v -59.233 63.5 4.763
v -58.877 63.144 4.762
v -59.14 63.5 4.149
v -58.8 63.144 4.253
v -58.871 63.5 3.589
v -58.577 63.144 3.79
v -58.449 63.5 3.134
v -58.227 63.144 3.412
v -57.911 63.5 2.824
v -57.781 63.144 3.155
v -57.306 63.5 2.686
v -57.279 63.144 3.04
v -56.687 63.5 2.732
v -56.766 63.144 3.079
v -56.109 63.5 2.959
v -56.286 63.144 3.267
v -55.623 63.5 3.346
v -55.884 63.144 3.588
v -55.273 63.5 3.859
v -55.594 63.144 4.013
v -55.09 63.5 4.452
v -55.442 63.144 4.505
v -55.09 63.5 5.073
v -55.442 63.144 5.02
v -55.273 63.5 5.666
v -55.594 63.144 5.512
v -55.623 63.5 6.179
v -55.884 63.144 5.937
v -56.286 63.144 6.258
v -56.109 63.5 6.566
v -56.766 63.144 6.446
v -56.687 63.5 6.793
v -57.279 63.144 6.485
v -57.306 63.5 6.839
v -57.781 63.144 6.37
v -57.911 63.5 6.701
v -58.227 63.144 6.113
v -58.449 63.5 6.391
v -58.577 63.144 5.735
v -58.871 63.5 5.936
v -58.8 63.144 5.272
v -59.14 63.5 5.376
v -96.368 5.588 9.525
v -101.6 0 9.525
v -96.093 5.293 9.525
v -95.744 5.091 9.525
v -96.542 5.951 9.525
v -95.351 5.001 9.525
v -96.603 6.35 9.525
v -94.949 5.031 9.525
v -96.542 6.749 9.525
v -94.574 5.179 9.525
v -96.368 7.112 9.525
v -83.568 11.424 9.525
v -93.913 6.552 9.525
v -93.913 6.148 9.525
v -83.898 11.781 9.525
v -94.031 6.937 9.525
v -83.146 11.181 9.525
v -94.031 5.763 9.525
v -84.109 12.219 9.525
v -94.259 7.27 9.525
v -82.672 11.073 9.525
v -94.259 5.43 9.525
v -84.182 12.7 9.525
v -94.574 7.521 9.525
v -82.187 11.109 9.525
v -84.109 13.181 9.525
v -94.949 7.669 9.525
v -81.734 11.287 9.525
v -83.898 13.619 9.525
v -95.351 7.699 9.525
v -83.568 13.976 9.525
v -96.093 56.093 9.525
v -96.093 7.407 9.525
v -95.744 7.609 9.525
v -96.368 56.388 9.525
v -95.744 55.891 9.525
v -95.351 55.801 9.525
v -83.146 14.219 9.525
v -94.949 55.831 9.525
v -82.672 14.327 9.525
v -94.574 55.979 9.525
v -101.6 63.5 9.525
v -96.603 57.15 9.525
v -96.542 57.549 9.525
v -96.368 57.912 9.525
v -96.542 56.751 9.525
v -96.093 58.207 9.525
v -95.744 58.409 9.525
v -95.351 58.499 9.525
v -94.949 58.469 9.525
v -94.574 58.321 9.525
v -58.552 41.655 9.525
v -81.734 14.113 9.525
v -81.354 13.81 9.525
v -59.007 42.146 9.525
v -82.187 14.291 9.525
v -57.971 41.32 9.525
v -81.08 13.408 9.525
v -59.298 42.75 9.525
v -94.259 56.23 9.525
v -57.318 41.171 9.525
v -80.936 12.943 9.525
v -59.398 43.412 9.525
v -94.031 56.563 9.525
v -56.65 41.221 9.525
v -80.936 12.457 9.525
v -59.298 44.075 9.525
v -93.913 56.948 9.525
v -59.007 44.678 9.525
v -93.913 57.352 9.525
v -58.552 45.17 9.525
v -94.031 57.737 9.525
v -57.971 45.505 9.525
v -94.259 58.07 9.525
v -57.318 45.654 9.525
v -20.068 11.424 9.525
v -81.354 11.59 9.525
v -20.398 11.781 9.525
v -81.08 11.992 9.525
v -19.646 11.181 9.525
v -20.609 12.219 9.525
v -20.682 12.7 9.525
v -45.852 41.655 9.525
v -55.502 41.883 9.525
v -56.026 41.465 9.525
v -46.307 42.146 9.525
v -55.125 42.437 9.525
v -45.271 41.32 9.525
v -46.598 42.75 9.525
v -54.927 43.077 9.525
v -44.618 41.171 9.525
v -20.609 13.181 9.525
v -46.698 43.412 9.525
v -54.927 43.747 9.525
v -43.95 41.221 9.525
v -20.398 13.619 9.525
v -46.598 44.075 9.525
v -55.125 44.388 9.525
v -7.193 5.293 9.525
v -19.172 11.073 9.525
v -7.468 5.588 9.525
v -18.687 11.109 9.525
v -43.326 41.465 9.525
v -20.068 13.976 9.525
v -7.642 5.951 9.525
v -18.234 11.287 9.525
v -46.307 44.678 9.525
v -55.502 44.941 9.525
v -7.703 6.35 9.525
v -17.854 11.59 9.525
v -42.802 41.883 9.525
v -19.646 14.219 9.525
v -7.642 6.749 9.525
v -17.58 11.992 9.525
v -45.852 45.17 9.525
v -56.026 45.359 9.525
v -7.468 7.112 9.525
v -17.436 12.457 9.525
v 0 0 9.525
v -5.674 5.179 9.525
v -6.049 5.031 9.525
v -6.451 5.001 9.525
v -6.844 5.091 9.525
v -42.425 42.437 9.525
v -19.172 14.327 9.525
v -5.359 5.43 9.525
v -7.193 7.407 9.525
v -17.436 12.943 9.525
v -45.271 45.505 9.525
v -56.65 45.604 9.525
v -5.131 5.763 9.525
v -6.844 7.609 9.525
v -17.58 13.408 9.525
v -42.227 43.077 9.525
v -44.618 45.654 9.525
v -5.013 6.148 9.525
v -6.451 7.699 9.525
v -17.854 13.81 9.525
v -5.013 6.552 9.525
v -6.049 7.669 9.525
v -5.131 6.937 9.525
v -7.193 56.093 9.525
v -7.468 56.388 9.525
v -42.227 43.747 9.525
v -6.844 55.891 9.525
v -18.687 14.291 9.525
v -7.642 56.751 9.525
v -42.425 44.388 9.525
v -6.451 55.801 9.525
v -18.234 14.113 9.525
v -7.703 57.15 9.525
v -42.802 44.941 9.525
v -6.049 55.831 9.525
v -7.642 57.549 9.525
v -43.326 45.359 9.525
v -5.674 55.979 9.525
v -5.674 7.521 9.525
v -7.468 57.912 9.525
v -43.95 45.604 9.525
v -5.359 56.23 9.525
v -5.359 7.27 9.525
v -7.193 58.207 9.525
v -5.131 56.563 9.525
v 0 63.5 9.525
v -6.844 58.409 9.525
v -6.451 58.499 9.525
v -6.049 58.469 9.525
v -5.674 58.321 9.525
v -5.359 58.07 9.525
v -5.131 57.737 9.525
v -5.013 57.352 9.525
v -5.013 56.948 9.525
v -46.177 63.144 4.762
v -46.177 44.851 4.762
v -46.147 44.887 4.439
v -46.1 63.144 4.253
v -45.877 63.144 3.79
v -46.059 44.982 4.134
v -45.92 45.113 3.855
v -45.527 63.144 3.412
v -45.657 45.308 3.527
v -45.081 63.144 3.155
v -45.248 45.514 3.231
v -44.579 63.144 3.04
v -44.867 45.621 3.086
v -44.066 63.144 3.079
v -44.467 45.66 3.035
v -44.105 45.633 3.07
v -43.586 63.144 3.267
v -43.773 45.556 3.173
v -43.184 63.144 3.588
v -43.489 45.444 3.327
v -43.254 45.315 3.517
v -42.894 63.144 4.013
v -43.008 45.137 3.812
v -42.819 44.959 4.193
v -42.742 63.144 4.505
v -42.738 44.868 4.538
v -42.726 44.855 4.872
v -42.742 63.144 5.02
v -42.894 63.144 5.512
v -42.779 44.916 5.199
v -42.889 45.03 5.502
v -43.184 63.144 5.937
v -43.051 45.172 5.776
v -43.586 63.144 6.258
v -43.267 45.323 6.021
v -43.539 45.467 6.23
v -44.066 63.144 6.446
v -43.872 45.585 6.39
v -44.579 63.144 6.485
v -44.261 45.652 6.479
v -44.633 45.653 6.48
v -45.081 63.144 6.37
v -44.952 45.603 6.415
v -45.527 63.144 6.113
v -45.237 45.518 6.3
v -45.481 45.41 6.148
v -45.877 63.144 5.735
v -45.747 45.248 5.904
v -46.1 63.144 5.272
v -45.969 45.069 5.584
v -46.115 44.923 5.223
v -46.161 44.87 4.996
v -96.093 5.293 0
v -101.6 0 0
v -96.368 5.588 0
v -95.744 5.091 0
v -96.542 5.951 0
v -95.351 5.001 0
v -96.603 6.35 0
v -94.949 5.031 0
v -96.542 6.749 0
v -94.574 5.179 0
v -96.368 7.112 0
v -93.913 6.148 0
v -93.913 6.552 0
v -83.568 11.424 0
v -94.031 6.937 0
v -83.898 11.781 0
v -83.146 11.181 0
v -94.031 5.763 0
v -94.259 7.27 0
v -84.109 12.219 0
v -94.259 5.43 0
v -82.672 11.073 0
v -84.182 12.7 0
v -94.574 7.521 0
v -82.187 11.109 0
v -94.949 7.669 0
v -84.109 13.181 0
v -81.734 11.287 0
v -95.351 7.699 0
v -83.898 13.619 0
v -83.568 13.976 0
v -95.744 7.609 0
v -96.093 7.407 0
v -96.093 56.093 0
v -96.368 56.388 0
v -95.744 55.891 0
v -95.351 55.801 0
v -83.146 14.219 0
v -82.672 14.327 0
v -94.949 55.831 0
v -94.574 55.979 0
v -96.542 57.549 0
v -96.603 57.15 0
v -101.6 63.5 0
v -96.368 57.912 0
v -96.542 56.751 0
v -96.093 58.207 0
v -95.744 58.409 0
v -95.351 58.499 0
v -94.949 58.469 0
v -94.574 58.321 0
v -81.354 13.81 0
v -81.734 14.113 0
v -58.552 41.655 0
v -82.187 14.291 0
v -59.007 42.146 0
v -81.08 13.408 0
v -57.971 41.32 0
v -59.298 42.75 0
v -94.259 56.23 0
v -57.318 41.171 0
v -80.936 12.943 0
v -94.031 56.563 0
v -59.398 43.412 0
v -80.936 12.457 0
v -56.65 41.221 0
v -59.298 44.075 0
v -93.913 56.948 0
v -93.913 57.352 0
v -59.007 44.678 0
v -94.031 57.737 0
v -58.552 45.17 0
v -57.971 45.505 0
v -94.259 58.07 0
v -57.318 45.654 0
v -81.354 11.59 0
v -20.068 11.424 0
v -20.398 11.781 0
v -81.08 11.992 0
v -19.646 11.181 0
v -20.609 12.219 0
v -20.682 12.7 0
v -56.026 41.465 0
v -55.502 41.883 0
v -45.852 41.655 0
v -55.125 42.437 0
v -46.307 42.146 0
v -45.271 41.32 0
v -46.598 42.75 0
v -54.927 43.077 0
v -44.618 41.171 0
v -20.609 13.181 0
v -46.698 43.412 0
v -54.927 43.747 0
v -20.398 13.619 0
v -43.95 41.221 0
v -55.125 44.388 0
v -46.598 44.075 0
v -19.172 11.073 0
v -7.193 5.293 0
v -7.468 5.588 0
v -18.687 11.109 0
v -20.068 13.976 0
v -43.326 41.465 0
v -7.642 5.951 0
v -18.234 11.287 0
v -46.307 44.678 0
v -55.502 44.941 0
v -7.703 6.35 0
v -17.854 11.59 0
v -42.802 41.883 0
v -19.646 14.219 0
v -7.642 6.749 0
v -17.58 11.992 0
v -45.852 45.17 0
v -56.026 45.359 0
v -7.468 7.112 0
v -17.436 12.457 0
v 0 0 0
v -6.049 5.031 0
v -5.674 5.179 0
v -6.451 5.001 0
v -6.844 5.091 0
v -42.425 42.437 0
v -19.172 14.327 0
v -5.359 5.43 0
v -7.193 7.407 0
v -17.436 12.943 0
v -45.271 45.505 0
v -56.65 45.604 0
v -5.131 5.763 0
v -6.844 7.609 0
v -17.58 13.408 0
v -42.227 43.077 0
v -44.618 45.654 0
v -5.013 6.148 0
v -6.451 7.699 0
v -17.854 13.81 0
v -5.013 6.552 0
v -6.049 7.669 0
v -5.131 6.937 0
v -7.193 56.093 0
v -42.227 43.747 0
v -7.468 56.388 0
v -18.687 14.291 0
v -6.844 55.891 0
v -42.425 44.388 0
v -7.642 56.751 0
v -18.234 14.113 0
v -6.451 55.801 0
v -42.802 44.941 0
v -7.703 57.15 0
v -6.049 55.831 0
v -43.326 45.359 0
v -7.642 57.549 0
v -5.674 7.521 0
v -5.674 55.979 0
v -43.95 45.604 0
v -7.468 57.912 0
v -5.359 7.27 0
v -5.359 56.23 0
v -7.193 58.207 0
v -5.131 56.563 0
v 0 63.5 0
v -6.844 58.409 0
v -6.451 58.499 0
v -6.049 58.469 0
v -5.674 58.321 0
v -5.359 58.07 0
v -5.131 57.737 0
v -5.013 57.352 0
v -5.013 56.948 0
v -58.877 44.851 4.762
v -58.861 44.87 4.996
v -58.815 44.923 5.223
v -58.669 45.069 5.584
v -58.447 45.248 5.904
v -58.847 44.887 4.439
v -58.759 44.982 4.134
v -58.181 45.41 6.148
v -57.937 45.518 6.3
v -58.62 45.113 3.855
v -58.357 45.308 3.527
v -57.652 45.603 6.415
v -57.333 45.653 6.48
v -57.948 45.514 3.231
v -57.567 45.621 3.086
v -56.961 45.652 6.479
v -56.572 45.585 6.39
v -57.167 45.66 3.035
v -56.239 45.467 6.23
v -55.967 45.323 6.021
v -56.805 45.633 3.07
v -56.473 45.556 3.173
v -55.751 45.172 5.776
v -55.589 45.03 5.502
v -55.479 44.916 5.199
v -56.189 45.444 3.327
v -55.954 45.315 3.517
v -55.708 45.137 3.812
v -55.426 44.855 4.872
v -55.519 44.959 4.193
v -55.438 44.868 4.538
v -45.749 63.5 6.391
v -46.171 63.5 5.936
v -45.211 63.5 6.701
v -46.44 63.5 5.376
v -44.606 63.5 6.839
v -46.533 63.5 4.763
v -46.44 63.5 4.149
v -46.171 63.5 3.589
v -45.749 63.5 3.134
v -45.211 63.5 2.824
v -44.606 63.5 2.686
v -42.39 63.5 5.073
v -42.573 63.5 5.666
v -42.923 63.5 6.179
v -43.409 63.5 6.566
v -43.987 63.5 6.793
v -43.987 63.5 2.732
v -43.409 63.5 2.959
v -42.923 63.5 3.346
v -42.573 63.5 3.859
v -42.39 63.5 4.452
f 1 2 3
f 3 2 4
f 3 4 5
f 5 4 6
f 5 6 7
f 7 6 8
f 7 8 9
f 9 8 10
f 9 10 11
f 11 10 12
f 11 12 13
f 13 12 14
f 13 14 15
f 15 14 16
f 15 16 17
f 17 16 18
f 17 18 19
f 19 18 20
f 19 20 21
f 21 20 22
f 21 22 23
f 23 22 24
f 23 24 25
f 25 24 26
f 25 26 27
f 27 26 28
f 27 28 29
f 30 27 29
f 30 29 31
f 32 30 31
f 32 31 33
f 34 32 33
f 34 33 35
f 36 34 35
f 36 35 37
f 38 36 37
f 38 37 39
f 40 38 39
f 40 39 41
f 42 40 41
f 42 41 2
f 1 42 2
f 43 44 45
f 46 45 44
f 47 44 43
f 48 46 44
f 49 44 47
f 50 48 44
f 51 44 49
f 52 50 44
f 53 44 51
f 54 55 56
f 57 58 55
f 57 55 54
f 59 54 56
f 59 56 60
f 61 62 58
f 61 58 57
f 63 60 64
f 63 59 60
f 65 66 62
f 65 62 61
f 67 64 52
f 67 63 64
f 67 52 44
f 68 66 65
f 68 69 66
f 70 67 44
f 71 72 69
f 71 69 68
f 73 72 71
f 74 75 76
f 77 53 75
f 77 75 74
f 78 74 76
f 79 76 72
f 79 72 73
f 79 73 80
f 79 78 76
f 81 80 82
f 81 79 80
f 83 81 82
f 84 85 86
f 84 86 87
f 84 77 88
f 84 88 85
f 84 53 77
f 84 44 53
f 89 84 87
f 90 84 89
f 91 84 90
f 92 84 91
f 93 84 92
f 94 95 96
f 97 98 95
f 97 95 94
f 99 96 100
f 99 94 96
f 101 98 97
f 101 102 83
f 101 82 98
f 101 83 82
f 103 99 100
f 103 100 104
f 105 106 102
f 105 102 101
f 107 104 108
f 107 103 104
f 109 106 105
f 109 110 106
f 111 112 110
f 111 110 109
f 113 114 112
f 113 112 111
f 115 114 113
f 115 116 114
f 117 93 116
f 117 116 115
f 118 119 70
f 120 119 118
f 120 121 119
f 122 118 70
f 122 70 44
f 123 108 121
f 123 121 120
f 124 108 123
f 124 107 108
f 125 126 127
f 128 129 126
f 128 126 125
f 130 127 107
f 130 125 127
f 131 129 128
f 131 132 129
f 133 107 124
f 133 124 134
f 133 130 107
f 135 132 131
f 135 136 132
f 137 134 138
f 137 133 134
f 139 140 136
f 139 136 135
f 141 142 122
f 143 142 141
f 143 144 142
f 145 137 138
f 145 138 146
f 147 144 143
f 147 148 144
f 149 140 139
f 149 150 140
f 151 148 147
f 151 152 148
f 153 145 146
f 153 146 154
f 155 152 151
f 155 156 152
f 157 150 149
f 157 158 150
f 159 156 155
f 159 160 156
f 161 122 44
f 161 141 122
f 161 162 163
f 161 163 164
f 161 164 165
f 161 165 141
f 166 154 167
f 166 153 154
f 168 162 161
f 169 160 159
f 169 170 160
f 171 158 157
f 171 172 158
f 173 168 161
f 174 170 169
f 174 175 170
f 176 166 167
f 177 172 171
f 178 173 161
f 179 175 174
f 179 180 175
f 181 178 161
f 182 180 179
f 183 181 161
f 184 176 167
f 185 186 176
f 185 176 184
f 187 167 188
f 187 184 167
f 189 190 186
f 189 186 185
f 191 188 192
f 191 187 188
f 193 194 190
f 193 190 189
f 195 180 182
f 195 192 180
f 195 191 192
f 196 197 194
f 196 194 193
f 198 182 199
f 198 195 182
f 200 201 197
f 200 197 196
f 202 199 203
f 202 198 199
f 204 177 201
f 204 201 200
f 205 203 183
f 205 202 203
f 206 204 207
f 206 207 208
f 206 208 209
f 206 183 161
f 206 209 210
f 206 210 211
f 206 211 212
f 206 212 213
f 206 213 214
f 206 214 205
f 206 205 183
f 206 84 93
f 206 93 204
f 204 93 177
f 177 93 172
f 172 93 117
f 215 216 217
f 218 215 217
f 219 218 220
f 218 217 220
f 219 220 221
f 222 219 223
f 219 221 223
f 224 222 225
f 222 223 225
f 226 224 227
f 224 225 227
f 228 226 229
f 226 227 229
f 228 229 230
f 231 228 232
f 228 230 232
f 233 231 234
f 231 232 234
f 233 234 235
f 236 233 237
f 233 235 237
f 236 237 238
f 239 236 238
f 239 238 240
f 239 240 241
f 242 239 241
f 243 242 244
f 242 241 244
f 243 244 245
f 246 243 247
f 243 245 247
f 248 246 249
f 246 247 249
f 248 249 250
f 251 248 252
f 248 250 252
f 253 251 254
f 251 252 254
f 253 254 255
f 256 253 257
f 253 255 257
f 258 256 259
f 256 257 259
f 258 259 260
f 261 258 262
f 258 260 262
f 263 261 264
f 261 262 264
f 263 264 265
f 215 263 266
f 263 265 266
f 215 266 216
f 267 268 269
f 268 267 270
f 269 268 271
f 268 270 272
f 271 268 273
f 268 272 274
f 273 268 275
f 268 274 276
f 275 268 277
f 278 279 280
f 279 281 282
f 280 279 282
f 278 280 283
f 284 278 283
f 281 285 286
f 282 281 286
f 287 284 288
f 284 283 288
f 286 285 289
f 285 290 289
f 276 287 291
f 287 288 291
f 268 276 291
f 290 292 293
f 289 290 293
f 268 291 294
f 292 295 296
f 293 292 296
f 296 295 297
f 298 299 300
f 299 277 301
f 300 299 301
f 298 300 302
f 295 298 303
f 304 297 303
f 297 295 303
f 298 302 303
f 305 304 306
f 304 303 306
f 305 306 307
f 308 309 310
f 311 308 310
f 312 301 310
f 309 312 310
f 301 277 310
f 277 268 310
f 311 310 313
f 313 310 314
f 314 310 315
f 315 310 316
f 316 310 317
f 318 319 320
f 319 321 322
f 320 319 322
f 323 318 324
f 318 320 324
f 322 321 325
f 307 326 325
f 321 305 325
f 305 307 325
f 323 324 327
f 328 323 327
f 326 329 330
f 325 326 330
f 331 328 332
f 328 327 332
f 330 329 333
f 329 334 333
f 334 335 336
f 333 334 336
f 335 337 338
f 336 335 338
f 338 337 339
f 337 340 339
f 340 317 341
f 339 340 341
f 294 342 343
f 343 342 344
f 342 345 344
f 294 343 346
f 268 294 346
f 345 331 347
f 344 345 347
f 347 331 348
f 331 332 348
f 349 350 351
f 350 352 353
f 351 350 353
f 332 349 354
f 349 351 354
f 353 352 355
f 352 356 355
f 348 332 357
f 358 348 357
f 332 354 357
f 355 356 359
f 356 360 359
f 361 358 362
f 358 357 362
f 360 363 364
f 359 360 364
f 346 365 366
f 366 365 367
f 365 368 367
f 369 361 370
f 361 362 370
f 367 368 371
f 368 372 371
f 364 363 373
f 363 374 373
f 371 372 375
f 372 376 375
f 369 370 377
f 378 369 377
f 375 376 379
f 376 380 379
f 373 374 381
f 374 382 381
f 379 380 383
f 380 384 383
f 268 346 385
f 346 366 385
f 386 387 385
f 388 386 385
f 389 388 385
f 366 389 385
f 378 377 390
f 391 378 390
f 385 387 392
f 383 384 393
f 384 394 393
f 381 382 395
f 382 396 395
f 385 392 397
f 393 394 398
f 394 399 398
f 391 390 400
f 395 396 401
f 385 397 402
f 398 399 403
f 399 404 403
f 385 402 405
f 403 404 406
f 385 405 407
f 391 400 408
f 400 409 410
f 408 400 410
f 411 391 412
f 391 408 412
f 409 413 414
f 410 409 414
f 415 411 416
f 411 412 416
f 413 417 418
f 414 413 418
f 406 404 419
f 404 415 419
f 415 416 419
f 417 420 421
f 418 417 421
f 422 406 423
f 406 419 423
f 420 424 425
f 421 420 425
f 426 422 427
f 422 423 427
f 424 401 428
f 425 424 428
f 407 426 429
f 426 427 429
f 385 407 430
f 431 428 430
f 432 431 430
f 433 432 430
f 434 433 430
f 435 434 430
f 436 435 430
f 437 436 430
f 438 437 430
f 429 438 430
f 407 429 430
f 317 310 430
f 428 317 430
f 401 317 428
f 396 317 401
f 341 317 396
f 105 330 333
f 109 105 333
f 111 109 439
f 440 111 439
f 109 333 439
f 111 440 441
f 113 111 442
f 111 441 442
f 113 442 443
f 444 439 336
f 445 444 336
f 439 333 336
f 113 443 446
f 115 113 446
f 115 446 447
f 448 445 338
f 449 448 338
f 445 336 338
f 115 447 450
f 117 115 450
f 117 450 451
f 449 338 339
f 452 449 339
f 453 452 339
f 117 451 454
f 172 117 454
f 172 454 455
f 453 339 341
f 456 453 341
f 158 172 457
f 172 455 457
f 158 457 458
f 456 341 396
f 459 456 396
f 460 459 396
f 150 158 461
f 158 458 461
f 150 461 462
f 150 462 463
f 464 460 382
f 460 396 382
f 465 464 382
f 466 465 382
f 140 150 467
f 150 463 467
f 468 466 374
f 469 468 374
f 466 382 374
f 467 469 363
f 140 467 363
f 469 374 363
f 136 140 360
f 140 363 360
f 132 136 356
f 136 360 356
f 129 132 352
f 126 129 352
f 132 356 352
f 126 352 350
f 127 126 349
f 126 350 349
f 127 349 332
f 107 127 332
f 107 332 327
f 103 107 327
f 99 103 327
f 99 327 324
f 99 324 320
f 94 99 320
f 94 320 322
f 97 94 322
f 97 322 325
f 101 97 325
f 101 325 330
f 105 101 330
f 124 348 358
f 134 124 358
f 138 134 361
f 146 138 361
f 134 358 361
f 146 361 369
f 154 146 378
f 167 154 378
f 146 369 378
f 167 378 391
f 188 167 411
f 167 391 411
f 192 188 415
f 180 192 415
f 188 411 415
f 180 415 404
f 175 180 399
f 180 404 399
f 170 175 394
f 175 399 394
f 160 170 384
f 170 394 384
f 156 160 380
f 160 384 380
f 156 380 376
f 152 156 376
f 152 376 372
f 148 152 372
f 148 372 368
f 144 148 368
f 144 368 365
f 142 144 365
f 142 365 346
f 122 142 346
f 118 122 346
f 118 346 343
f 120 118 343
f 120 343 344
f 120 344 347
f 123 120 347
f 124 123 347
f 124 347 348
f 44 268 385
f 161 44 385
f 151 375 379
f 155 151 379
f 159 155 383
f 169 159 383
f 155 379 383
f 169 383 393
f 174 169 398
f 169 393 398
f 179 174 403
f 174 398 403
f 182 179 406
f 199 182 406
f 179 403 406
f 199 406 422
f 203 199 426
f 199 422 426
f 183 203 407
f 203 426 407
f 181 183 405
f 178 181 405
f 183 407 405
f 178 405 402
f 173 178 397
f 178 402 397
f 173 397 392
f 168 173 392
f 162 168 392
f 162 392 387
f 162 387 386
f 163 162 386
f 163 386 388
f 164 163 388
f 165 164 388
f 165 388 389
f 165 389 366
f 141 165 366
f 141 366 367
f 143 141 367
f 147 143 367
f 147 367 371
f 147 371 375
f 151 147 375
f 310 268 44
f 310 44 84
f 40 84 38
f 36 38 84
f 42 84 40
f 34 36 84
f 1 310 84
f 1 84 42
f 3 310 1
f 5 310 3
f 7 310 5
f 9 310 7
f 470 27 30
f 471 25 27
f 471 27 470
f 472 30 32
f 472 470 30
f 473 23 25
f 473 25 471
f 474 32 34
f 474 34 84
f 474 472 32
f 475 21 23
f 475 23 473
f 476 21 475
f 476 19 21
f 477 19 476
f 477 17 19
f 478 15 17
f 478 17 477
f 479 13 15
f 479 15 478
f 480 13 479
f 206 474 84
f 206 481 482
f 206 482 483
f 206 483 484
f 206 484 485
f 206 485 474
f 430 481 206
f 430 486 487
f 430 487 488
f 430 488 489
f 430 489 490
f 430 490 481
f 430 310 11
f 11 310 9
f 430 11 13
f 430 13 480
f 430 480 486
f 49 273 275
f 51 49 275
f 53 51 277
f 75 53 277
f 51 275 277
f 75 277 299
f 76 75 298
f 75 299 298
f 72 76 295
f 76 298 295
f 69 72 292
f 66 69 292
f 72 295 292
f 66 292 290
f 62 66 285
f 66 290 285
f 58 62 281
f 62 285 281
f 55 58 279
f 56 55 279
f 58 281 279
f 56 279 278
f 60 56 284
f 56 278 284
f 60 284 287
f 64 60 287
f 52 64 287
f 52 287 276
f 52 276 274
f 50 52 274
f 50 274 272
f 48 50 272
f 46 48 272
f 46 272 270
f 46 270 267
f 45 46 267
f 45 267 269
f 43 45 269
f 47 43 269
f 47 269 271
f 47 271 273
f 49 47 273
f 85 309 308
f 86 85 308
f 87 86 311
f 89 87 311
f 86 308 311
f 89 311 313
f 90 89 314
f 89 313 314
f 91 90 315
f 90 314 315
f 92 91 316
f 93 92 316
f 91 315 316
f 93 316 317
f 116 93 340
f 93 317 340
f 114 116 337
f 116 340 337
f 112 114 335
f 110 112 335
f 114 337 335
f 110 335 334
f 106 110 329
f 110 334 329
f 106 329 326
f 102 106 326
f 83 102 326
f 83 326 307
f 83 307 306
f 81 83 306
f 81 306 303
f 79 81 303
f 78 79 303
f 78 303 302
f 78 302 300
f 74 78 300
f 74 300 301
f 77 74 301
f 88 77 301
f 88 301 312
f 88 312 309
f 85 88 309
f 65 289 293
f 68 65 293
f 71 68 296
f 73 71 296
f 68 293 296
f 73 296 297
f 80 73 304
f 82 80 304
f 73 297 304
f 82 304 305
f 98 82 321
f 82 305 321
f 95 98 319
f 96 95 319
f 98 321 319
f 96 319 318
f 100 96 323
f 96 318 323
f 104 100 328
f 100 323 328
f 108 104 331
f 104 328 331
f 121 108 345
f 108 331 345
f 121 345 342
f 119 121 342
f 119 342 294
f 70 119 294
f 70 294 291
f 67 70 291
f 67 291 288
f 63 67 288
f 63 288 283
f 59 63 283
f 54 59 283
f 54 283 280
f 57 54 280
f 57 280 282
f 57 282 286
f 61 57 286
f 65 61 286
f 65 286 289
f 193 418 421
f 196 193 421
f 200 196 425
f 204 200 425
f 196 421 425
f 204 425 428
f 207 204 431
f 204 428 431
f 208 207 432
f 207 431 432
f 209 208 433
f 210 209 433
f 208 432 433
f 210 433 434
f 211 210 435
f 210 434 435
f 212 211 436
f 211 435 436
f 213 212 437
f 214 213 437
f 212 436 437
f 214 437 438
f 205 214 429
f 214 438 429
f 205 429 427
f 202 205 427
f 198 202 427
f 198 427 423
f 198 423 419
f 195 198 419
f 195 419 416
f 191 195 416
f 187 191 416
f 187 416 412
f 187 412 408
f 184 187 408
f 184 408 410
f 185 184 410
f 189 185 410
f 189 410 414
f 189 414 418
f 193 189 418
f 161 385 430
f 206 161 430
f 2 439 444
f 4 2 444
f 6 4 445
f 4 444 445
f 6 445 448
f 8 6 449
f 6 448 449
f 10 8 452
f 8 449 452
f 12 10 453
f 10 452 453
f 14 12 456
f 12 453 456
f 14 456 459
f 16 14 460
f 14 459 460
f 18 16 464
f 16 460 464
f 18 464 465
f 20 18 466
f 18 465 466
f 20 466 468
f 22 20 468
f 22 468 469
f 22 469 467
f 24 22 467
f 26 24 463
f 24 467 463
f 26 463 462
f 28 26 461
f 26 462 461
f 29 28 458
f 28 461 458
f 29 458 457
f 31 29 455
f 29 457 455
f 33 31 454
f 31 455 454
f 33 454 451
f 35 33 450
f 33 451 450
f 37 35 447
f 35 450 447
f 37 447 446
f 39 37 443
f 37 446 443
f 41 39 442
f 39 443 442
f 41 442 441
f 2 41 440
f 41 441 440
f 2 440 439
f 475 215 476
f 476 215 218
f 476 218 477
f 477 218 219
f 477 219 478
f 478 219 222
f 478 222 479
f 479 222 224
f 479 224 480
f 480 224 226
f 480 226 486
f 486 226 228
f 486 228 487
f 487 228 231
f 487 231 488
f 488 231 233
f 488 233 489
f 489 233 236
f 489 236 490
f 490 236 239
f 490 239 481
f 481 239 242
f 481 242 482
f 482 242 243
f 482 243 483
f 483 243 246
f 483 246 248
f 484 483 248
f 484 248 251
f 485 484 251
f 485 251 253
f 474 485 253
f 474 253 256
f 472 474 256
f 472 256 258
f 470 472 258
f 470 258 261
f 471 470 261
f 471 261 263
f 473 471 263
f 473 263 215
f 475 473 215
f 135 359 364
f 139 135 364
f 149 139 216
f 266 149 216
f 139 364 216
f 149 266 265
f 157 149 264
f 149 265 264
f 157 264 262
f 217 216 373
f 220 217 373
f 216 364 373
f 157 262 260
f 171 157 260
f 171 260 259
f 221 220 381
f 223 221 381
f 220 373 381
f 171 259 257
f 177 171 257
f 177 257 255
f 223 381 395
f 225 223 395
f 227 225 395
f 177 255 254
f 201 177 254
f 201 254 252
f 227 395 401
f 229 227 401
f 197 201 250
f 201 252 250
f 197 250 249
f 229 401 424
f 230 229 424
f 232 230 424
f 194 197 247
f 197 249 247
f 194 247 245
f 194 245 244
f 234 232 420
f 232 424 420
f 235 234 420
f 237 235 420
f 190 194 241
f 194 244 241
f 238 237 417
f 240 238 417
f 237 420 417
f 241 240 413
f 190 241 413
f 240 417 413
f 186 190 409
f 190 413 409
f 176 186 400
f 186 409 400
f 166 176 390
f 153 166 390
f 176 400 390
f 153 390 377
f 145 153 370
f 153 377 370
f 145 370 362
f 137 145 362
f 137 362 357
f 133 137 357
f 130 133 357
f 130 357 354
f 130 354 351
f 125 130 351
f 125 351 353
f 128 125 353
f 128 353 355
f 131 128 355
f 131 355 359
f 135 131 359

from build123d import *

# Parameters (mm, degrees)
SKETCH1_W                       = 101.6
SKETCH1_H                       = 63.5
BOSS_EXTRUDE1_DEPTH             = 9.525
F_8_32_TAPPED_HOLE1_D           = 3.4544
F_8_32_TAPPED_HOLE1_DEPTH       = 19.05
F_8_32_TAPPED_HOLE1_CSINK_D     = 4.1656
F_8_32_TAPPED_HOLE1_CSINK_ANGLE = 90
F_8_32_TAPPED_HOLE1_TIP         = 1.037806461
F_8_CLEARANCE_HOLE2_D           = 4.4958
F_8_CLEARANCE_HOLE2_DEPTH       = 25.4
F_8_CLEARANCE_HOLE2_TIP         = 1.350674586
F_6_32_TAPPED_HOLE1_D           = 2.7051
F_4_CLEARANCE_HOLE1_D           = 3.2639
F_4_CLEARANCE_HOLE1_DEPTH       = 9.525


with BuildPart() as part:
    # Sketch1 → Boss-Extrude1 (new body)
    with BuildSketch(Plane.XY):
        with Locations((-50.8, 31.75)):
            Rectangle(SKETCH1_W, SKETCH1_H)
    extrude(amount=BOSS_EXTRUDE1_DEPTH)

    # #8-32 Tapped Hole1
    with Locations(Plane(origin=(0, 63.5, 0), x_dir=(1, 0, 0), z_dir=(0, 1, 0))):
        with Locations((-44.45, -4.7625), (-57.15, -4.7625)):
            CounterSinkHole(F_8_32_TAPPED_HOLE1_D / 2, F_8_32_TAPPED_HOLE1_CSINK_D / 2, depth=F_8_32_TAPPED_HOLE1_DEPTH, counter_sink_angle=F_8_32_TAPPED_HOLE1_CSINK_ANGLE)
            with Locations((0, 0, -(F_8_32_TAPPED_HOLE1_DEPTH + F_8_32_TAPPED_HOLE1_TIP / 2))):  # 118° drill point
                Cone(0, F_8_32_TAPPED_HOLE1_D / 2, F_8_32_TAPPED_HOLE1_TIP, mode=Mode.SUBTRACT)

    # #8 Clearance Hole2
    with Locations(Plane.XY.offset(9.525)):
        with Locations((-44.45, 43.412193539), (-57.15, 43.412193539)):
            Hole(F_8_CLEARANCE_HOLE2_D / 2, depth=F_8_CLEARANCE_HOLE2_DEPTH)
            with Locations((0, 0, -(F_8_CLEARANCE_HOLE2_DEPTH + F_8_CLEARANCE_HOLE2_TIP / 2))):  # 118° drill point
                Cone(0, F_8_CLEARANCE_HOLE2_D / 2, F_8_CLEARANCE_HOLE2_TIP, mode=Mode.SUBTRACT)

    # #6-32 Tapped Hole1 (through all)
    with Locations(Plane.XY.offset(9.525)):
        with Locations((-95.25, 6.35), (-95.25, 57.15), (-6.35, 6.35), (-6.35, 57.15)):
            Hole(F_6_32_TAPPED_HOLE1_D / 2)

    # #4 Clearance Hole1
    with Locations(Plane.XY.offset(9.525)):
        with Locations((-82.55, 12.7), (-19.05, 12.7)):
            Hole(F_4_CLEARANCE_HOLE1_D / 2, depth=F_4_CLEARANCE_HOLE1_DEPTH)


solid = part.part
